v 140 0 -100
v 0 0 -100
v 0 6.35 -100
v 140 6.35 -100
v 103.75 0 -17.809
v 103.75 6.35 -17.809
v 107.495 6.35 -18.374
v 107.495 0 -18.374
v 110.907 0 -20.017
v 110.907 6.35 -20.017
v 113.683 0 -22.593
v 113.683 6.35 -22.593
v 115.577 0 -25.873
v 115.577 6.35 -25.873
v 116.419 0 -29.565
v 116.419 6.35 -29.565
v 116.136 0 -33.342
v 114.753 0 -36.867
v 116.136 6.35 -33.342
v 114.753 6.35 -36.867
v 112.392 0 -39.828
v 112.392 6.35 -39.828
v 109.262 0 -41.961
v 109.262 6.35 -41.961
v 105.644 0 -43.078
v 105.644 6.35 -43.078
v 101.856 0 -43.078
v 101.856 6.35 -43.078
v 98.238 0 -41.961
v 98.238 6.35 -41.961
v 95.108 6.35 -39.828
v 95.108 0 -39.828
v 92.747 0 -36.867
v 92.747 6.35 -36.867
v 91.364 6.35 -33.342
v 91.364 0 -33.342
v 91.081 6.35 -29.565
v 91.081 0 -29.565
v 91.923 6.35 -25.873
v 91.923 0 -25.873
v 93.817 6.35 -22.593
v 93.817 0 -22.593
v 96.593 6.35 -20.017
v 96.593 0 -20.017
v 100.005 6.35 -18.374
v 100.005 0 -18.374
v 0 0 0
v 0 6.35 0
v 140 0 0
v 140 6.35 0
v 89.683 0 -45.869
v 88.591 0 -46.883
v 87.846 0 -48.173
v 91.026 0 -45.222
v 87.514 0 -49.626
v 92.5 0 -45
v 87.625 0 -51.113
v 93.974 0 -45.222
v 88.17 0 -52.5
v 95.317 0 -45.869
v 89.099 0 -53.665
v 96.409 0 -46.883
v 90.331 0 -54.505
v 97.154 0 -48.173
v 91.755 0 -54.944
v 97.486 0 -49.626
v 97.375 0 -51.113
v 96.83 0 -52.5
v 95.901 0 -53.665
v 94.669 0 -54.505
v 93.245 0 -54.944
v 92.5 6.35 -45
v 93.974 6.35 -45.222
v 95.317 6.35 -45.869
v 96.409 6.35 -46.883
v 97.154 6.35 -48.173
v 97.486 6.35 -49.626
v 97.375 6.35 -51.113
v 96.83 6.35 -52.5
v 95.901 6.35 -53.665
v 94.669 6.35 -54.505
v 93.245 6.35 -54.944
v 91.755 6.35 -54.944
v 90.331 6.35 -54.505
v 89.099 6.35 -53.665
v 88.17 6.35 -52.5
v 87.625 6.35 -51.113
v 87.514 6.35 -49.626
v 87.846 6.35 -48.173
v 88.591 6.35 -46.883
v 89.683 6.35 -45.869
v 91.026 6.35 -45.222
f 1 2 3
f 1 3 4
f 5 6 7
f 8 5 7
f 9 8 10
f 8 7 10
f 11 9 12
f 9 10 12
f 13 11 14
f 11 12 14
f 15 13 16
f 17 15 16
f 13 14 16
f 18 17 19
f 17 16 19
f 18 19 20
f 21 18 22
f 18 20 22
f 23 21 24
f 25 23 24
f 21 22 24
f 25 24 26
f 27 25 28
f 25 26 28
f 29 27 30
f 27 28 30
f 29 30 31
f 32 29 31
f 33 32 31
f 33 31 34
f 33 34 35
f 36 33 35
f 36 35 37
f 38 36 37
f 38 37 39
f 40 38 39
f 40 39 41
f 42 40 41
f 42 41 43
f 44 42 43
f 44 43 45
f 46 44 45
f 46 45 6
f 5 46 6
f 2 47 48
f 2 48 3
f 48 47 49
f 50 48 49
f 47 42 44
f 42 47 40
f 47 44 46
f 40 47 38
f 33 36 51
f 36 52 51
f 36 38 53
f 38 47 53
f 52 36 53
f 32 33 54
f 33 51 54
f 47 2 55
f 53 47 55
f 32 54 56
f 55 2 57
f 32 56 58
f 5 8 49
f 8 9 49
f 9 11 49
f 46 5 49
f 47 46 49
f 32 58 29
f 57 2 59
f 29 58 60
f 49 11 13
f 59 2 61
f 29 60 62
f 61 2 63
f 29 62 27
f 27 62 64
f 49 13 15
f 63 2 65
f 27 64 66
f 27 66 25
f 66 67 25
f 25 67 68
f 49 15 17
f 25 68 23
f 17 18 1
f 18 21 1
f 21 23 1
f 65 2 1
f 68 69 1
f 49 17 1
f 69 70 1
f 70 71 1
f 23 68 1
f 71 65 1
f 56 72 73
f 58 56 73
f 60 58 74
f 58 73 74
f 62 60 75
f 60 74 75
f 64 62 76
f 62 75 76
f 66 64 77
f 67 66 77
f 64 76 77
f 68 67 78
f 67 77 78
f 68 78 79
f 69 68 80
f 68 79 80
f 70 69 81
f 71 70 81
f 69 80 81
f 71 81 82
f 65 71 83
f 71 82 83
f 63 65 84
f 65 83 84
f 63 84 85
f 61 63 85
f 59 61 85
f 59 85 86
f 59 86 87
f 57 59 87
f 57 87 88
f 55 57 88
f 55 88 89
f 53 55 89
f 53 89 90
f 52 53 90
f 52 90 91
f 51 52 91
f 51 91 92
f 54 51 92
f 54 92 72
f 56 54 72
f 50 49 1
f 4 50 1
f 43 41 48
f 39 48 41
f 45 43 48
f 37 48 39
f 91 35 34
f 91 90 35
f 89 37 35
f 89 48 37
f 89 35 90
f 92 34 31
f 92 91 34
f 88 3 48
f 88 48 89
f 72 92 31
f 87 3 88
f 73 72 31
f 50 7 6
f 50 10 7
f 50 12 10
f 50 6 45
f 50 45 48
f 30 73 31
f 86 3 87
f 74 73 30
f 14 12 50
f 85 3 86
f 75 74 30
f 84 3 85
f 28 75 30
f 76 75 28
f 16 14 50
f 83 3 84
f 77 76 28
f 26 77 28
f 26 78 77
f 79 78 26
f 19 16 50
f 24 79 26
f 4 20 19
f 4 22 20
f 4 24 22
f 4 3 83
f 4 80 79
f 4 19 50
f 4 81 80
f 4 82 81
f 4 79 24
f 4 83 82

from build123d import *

# Parameters (mm, degrees)
SKETCH1_W           = 140
SKETCH1_H           = 100
BOSS_EXTRUDE1_DEPTH = 6.35
SKETCH2_R           = 12.705
SKETCH2_R_2         = 5
CUT_EXTRUDE1_DEPTH  = 10


with BuildPart() as part:
    # Sketch1 → Boss-Extrude1 (new body)
    with BuildSketch(Plane(origin=(0, 0, 0), x_dir=(1, 0, 0), z_dir=(0, 1, 0))):
        with Locations((70, 50)):
            Rectangle(SKETCH1_W, SKETCH1_H)
    extrude(amount=BOSS_EXTRUDE1_DEPTH)

    # Sketch2 → Cut-Extrude1 (cut)
    with BuildSketch(Plane(origin=(0, 6.35, 0), x_dir=(1, 0, 0), z_dir=(0, 1, 0))):
        with Locations(Location((103.75, 30.514428415, 0), (0, 0, 270))):
            Circle(SKETCH2_R)
        with Locations(Location((92.5, 50, 0), (0, 0, 270))):
            Circle(SKETCH2_R_2)
    extrude(amount=-CUT_EXTRUDE1_DEPTH, mode=Mode.SUBTRACT)


solid = part.part
